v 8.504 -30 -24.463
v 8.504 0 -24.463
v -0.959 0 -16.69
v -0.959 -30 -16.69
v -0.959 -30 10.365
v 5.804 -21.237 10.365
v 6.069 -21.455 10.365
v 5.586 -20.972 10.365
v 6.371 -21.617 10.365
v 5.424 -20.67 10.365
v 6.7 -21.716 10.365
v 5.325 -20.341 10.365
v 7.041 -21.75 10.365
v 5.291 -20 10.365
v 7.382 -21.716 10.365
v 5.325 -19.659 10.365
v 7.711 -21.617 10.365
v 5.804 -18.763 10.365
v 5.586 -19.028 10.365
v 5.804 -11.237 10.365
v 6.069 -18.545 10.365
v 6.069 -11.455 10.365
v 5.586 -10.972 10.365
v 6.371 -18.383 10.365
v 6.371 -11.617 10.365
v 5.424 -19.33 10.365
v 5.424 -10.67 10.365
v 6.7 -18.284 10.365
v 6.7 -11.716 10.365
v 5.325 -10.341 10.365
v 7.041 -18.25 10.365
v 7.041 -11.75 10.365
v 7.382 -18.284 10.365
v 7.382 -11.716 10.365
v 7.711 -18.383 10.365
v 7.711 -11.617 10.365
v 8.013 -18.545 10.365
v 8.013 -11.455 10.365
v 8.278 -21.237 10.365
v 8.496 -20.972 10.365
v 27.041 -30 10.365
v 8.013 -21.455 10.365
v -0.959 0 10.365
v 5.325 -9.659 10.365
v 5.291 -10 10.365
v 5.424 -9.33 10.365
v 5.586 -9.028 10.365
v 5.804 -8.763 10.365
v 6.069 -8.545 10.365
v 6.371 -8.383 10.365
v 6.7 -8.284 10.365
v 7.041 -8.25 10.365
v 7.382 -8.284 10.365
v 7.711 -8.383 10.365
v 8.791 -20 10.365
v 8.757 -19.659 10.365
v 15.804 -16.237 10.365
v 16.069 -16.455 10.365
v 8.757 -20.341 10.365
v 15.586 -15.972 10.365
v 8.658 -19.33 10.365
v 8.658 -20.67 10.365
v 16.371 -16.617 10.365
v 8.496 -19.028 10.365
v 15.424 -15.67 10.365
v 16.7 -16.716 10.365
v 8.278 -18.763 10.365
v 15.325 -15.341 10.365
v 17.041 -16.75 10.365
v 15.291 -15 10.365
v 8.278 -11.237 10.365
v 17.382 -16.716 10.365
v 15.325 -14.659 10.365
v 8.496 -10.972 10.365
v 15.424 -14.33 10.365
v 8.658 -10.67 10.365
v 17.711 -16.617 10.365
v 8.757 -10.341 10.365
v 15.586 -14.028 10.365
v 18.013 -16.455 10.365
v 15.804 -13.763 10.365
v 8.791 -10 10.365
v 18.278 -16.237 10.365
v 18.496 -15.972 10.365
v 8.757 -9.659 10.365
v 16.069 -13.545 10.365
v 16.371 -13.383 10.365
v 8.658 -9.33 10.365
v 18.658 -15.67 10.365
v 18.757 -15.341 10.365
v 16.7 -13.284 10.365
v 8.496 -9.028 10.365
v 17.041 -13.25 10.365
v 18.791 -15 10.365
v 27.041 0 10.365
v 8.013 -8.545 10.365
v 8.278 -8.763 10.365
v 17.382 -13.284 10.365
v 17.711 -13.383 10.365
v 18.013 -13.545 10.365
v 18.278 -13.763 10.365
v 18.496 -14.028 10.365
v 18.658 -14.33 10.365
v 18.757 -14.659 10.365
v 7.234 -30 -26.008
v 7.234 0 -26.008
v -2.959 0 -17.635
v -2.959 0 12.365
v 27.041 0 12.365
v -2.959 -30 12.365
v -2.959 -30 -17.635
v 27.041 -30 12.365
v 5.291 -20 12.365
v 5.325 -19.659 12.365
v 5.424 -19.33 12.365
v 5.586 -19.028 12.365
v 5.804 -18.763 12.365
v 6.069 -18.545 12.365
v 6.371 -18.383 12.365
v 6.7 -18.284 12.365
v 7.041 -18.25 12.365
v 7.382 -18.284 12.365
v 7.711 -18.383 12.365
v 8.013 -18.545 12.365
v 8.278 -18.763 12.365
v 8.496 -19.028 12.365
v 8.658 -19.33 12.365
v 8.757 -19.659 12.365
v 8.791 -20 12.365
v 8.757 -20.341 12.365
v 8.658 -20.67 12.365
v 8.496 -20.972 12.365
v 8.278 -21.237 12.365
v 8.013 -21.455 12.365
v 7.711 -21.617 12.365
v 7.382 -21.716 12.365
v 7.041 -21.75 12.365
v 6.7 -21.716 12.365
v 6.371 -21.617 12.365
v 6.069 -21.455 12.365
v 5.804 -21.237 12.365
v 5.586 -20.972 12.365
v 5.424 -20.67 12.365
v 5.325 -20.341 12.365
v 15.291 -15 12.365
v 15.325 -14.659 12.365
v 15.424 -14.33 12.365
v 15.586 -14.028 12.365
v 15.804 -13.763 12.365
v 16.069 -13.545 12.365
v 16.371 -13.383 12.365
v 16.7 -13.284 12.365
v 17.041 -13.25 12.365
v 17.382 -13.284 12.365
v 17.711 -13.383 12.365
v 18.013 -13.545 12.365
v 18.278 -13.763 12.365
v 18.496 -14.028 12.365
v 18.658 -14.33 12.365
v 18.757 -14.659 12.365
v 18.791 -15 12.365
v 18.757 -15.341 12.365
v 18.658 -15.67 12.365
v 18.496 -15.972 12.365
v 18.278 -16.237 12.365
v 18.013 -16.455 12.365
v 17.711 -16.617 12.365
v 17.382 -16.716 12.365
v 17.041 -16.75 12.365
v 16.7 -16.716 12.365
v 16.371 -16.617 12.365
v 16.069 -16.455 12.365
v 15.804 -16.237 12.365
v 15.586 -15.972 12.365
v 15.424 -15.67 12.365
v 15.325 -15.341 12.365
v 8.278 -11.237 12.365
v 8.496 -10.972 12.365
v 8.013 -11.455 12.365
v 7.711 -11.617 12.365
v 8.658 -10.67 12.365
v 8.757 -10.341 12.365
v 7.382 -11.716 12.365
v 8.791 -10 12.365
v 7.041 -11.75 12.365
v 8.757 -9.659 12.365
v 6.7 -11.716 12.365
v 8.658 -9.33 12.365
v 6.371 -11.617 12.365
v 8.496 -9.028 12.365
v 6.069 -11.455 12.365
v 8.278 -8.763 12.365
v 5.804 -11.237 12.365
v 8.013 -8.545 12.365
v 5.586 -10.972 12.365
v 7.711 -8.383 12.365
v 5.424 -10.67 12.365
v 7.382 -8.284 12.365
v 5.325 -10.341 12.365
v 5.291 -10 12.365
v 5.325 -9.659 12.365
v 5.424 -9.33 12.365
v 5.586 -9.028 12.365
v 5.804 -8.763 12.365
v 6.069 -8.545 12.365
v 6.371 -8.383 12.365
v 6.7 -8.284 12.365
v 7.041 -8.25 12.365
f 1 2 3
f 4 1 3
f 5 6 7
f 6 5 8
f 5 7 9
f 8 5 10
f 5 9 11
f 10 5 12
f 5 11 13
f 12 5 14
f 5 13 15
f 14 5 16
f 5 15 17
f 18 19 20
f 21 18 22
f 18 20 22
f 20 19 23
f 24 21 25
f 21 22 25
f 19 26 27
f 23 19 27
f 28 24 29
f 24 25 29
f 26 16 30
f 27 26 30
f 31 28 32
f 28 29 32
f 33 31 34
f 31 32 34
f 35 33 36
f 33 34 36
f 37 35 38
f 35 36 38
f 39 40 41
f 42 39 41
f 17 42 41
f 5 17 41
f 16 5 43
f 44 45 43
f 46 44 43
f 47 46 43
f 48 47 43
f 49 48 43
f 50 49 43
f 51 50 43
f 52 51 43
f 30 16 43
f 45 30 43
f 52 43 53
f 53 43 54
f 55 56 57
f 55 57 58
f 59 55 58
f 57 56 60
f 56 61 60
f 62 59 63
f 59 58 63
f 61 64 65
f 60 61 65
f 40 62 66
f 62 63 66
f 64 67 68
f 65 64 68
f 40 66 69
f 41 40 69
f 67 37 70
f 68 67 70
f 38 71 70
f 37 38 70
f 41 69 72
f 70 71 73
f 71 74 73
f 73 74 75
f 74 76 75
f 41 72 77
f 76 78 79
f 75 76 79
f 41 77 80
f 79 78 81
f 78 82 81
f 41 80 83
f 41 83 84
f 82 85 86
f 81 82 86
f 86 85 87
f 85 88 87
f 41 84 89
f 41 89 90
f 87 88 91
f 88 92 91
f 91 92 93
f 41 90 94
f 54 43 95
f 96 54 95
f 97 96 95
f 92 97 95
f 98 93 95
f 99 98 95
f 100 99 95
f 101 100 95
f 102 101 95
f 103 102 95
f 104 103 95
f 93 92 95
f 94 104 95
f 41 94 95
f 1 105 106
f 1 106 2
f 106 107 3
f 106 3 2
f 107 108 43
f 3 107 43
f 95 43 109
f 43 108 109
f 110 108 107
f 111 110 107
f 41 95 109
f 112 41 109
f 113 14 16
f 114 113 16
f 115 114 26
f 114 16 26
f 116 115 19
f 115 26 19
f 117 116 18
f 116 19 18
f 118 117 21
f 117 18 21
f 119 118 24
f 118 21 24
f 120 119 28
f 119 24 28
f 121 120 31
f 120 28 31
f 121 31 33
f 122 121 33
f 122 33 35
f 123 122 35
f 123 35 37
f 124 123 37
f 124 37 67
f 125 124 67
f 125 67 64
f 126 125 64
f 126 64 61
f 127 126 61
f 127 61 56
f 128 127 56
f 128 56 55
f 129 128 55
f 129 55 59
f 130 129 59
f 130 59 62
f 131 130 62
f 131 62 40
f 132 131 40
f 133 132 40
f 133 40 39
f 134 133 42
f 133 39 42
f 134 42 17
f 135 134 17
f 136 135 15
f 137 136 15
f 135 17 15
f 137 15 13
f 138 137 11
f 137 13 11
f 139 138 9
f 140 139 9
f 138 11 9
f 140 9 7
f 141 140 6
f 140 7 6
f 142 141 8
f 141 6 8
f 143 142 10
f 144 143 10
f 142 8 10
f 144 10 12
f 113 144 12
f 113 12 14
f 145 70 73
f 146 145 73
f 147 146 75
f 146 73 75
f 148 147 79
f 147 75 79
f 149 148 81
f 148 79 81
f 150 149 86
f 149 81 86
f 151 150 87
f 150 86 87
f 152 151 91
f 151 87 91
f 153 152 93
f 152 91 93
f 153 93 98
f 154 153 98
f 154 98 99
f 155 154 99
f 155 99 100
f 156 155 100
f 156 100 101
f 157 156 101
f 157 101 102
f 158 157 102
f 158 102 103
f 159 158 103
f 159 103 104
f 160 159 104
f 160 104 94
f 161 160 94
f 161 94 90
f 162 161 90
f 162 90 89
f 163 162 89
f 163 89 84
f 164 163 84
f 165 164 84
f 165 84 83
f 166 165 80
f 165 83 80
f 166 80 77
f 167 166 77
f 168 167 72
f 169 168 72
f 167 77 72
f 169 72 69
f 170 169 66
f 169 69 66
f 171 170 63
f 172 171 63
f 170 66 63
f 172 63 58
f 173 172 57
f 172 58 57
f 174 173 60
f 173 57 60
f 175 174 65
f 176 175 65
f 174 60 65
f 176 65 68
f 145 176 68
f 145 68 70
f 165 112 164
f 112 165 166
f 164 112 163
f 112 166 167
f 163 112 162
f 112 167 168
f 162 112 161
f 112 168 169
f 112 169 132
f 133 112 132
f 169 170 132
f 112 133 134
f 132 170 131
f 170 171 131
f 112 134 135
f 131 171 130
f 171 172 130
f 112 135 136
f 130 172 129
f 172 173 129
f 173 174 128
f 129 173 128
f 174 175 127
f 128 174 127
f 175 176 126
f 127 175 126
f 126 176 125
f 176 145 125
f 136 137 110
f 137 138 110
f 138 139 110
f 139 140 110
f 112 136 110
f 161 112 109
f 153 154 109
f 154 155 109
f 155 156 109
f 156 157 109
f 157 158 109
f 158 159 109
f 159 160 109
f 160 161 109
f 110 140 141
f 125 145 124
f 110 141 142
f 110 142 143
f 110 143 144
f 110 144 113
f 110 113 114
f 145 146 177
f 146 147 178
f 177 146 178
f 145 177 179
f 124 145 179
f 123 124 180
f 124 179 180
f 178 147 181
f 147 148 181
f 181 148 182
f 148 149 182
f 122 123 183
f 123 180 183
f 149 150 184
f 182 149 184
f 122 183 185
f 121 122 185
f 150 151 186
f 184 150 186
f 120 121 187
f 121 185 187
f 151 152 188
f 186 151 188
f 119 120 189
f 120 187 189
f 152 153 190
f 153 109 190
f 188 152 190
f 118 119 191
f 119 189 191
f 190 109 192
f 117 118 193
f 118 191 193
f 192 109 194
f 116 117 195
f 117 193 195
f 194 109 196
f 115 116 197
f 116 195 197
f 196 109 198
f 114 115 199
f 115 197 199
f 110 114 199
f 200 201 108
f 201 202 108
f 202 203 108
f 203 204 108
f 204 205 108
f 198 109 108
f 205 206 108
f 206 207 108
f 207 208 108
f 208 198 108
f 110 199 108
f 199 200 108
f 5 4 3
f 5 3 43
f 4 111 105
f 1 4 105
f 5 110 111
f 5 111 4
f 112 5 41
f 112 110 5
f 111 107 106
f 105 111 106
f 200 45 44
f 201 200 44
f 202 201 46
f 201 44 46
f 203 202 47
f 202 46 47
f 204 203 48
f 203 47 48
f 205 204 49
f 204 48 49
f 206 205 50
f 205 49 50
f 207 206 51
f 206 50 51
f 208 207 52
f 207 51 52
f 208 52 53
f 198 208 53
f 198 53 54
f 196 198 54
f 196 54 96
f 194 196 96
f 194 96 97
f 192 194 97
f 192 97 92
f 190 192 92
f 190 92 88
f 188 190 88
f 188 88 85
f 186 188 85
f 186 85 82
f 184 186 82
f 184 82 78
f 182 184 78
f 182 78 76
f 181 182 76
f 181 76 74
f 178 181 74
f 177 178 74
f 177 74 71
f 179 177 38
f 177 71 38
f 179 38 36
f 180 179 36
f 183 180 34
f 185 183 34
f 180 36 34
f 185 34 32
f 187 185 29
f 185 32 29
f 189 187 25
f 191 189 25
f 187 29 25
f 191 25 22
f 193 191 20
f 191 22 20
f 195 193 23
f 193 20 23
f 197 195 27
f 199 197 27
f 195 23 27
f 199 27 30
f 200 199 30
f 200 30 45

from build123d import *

# Parameters (mm, degrees)
F1_DEPTH = 30
F3_D     = 3.5
F3_DEPTH = 5


with BuildPart() as f1:
    # F0 (on Front) → F1 (new body)
    with BuildSketch(Plane.XZ):
        Polygon((27.040993, 12.364779), (-2.959007, 12.364779), (-2.959007, -17.635221), (7.234091, -26.008121), (8.50357, -24.462669), (-0.959007, -16.689839), (-0.959007, 10.364779), (27.040993, 10.364779), align=None)
    extrude(amount=F1_DEPTH)

    # F3
    with Locations(Plane.XY.offset(12.364779)):
        with Locations((7.040993, -10), (17.040993, -15), (7.040993, -20)):
            Hole(F3_D / 2, depth=F3_DEPTH)


solid = f1.part
